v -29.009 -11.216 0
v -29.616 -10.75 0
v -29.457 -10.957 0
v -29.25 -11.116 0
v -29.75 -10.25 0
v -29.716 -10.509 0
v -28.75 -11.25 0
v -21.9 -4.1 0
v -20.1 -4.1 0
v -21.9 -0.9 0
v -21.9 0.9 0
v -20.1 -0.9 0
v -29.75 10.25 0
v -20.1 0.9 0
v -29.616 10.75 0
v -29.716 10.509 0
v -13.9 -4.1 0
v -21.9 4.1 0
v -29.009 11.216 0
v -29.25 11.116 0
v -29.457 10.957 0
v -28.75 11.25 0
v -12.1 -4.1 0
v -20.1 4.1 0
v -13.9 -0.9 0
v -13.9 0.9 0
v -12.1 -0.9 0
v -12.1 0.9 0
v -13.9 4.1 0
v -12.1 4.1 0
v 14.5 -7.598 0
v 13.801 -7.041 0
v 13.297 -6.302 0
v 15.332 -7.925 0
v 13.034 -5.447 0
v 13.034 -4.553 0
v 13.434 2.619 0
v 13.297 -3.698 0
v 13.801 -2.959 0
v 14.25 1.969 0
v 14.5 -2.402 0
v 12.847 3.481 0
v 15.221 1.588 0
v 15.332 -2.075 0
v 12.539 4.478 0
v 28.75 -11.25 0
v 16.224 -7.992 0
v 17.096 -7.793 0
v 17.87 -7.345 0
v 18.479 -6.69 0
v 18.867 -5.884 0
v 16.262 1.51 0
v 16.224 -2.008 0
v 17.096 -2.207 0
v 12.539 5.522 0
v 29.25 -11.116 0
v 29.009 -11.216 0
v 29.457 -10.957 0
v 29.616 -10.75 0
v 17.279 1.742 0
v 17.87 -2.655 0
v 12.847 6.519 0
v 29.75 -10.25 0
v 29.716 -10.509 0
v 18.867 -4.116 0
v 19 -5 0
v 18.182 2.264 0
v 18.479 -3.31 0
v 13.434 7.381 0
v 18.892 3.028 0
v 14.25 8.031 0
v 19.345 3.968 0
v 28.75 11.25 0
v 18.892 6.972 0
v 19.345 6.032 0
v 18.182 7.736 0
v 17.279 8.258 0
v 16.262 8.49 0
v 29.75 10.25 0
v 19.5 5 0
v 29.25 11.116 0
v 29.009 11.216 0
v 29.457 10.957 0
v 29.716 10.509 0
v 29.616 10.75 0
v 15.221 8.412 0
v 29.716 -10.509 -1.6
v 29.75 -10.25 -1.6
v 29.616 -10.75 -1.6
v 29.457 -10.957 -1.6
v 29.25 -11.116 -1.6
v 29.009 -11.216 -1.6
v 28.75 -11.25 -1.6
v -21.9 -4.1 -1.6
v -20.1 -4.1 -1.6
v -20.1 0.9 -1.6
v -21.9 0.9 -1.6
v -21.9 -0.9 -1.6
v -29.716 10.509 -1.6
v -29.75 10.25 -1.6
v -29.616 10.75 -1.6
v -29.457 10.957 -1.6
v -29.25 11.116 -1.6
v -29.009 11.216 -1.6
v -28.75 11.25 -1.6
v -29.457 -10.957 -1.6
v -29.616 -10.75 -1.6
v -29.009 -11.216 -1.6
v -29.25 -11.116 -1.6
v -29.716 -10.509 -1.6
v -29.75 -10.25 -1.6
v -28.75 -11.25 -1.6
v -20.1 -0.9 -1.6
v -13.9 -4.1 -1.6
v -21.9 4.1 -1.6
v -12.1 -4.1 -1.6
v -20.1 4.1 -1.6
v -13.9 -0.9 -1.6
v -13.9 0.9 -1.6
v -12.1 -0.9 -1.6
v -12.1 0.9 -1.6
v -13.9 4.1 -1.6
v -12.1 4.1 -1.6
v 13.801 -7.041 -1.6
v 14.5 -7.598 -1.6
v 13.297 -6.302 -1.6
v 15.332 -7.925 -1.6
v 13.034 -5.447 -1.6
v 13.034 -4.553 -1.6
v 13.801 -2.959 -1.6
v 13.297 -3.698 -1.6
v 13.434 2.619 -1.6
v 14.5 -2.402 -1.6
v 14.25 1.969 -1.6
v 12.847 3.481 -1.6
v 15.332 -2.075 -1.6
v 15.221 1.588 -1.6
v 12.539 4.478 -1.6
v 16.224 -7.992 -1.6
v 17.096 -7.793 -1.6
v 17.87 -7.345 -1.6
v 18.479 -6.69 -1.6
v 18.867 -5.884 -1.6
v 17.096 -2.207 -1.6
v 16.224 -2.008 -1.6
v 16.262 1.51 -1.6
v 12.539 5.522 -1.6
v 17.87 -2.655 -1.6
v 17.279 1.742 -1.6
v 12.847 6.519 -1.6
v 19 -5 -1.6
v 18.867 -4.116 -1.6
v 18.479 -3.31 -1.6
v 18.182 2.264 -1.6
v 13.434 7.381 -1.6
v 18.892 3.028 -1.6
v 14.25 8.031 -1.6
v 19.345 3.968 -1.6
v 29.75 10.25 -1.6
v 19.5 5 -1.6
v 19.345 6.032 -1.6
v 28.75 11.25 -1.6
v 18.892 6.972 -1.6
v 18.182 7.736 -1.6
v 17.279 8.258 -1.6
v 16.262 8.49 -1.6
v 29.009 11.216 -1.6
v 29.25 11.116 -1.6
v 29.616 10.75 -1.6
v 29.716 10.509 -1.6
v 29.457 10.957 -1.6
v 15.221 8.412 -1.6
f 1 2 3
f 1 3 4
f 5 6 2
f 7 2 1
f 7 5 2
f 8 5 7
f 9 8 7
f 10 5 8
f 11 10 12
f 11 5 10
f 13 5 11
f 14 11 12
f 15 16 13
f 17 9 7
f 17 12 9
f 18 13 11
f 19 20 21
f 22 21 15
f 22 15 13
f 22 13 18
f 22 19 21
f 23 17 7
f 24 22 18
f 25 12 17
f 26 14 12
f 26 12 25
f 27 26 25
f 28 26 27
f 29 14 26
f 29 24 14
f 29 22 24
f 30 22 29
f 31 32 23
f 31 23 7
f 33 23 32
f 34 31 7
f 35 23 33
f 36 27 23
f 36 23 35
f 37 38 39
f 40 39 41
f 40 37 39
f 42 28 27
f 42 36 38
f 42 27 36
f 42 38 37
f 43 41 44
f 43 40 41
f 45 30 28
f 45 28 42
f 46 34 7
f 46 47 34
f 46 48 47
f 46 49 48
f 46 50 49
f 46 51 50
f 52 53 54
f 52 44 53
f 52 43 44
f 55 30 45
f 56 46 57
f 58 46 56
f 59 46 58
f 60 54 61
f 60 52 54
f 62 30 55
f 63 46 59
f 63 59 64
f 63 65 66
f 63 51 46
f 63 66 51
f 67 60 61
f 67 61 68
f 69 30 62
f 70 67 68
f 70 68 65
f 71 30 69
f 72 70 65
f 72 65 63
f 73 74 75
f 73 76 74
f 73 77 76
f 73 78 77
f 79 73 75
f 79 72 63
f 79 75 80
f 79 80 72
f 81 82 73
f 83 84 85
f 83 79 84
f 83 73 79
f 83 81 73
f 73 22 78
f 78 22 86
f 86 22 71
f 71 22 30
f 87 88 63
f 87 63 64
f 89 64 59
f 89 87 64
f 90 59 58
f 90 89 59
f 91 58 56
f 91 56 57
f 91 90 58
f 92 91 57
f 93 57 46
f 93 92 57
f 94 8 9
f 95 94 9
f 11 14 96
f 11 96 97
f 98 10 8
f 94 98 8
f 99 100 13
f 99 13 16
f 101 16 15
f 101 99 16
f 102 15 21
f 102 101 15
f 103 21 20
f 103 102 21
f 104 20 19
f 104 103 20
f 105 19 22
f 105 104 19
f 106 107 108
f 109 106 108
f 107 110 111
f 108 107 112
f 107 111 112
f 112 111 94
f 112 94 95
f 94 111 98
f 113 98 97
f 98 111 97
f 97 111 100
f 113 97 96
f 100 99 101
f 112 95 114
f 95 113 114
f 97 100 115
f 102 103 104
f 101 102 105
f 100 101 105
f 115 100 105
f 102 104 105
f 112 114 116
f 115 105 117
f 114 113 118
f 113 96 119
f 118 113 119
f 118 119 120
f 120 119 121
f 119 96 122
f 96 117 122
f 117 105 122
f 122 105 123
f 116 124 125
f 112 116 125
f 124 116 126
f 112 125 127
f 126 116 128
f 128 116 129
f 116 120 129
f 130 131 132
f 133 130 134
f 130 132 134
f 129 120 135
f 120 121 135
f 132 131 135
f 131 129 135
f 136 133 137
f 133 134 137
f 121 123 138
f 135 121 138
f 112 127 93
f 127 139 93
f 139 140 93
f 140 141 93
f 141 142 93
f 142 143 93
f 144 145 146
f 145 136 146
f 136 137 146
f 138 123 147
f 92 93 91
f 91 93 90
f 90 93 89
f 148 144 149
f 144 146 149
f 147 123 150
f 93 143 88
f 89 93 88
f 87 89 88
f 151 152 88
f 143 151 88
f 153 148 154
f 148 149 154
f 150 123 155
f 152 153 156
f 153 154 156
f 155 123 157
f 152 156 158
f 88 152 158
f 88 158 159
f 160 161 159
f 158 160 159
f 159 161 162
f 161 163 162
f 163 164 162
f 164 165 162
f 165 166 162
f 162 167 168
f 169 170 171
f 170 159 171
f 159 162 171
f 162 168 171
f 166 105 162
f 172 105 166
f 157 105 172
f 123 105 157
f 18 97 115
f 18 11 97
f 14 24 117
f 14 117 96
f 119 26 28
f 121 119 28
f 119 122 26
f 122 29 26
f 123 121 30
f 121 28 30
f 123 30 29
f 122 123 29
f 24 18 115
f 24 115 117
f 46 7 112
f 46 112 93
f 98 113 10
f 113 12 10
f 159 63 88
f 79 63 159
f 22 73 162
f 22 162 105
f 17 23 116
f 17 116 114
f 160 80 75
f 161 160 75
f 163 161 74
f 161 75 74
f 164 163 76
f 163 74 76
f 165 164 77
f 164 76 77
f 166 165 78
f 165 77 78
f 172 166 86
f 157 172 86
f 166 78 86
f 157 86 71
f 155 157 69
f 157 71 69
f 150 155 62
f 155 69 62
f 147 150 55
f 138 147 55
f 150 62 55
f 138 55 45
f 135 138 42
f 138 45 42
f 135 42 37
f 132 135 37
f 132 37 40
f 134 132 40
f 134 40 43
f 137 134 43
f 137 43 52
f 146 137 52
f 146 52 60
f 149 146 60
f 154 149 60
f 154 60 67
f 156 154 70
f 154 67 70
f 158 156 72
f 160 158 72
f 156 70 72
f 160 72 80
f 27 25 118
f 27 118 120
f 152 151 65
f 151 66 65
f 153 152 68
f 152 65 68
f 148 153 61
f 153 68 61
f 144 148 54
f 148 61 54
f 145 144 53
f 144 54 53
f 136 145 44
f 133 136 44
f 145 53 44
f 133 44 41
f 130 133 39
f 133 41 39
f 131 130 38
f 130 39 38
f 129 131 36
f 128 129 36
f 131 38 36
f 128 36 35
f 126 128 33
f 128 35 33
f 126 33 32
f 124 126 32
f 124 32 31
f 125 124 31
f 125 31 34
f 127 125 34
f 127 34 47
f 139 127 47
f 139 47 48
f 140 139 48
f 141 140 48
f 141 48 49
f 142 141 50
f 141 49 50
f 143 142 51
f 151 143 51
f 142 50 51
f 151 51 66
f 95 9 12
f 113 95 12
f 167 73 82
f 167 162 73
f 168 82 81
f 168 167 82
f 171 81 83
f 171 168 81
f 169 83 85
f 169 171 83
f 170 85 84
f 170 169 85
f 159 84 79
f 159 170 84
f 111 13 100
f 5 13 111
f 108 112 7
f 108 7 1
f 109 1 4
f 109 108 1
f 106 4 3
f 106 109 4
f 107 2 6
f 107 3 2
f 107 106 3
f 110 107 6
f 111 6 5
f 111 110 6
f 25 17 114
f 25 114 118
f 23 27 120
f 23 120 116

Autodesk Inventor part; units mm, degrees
ref_plane "YZ Plane" through (0, 0, 0) normal (1, 0, 0) x (0, 1, 0)
ref_plane "XZ Plane" through (0, 0, 0) normal (0, 1, 0) x (-1, 0, 0)
ref_plane "XY Plane" through (0, 0, 0) normal (0, 0, 1) x (1, 0, 0)
sketch "Sketch1" plane through (0, 0, 0) normal (0, 0, 1) x (1, 0, 0)
  line L0 (-29.75, -11.25) -> (29.75, -11.25)
  line L1 (29.75, -11.25) -> (29.75, 11.25)
  line L2 (29.75, 11.25) -> (-29.75, 11.25)
  line L3 (-29.75, 11.25) -> (-29.75, -11.25)
  line L4 (-29.75, -11.25) -> (29.75, 11.25) construction
  line L5 (29.75, -11.25) -> (-29.75, 11.25) construction
  point P0 (0, 0)
  dimension "d0" = 59.5
  dimension "d1" = 22.5
extrude "Extrusion1" add sketch "Sketch1" against normal blind 1.6
fillet "Fillet1" radius 1 4 edges at (29.75, 11.25, -0.8) (-29.75, 11.25, -0.8) (29.75, -11.25, -0.8) (-29.75, -11.25, -0.8)
sketch "Sketch2" plane through (0, 0, 0) normal (0, 0, 1) x (1, 0, 0)
  line L0 (-21.9, 4.1) -> (-20.1, 4.1)
  line L1 (-20.1, 4.1) -> (-20.1, 0.9)
  line L2 (-20.1, 0.9) -> (-21.9, 0.9)
  line L3 (-21.9, 0.9) -> (-21.9, 4.1)
  line L4 (-21.9, 4.1) -> (-20.1, 0.9) construction
  line L5 (-20.1, 4.1) -> (-21.9, 0.9) construction
  line L6 (-20.1, -0.9) -> (-21.9, -0.9)
  line L7 (-21.9, -0.9) -> (-21.9, -4.1)
  line L8 (-21.9, -4.1) -> (-20.1, -4.1)
  line L9 (-20.1, -4.1) -> (-20.1, -0.9)
  line L10 (-20.1, -0.9) -> (-21.9, -4.1) construction
  line L11 (-21.9, -0.9) -> (-20.1, -4.1) construction
  line L12 (-17, 0) -> (-17, 5.3945) construction
  line L13 (-12.1, 4.1) -> (-13.9, 4.1)
  line L14 (-13.9, 4.1) -> (-13.9, 0.9)
  line L15 (-13.9, 0.9) -> (-12.1, 0.9)
  line L16 (-12.1, 0.9) -> (-12.1, 4.1)
  line L17 (-12.1, 4.1) -> (-13.9, 0.9) construction
  line L18 (-13.9, 4.1) -> (-12.1, 0.9) construction
  line L19 (-13.9, -0.9) -> (-12.1, -0.9)
  line L20 (-12.1, -0.9) -> (-12.1, -4.1)
  line L21 (-12.1, -4.1) -> (-13.9, -4.1)
  line L22 (-13.9, -4.1) -> (-13.9, -0.9)
  line L23 (-13.9, -0.9) -> (-12.1, -4.1) construction
  line L24 (-12.1, -0.9) -> (-13.9, -4.1) construction
  line L25 (-29.75, 10.25) -> (-29.75, -10.25) projected
  line L26 (-28.75, -11.25) -> (28.75, -11.25) projected
  point P0 (0, 0)
  point P1 (-21, 2.5)
  point P2 (-21, -2.5)
  point P3 (-13, 2.5)
  point P4 (-13, -2.5)
  dimension "d5" = 17
  dimension "d6" = 1.8
  dimension "d7" = 0.9
  dimension "d8" = 0
  dimension "d10" = 1.8
  dimension "d11" = 1.8
  dimension "d12" = 3.2
  dimension "d13" = 3.2
  dimension "d16" = 4
  dimension "d17" = 8.75
  dimension "d28" = 11.25
  dimension "d29" = 16.75
extrude "Extrusion2" cut sketch "Sketch2" against normal blind 1.6
sketch "Sketch3" plane through (0, 0, 0) normal (0, 0, 1) x (1, 0, 0)
  line L0 (-29.75, 10.25) -> (-29.75, -10.25) construction
  line L1 (16, 5) -> (16, -5) construction
  circle A0 centre (16, 5) radius 3.5
  circle A1 centre (16, -5) radius 3
  line L2 (-28.75, -11.25) -> (28.75, -11.25) projected
  point P0 (0, 0)
  dimension "d18" = 7
  dimension "d19" = 6
  dimension "d20" = 10
  dimension "d21" = 5
  dimension "d22" = 16
  dimension "d25" = 45.75
  dimension "d26" = 6.25
  dimension "d27" = 16.25
extrude "Extrusion3" cut sketch "Sketch3" against normal through all
sketch "Sketch4" plane through (0, 0, 0) normal (0, 0, 1) x (1, 0, 0)
  line L0 (-29.75, 11.25) -> (29.75, 11.25) construction
  line L1 (29.75, 11.25) -> (29.75, -11.2319) construction
  line L2 (29.75, -11.2319) -> (-29.75, -11.2319) construction
  line L3 (-29.75, -11.2319) -> (-29.75, 11.25) construction
  line L4 (28.75, 11.25) -> (-28.75, 11.25) projected
  line L5 (-29.75, 10.25) -> (-29.75, -10.25) projected
  line L6 (29.75, -10.25) -> (29.75, 10.25) projected
  point P0 (0, 0)
decal "Decal1"
sketch "Sketch5" plane through (0, 0, -1.6) normal (0, 0, -1) x (-1, 0, 0)
  line L0 (-29.75, 11.25) -> (29.75, 11.25) construction
  line L1 (29.75, 11.25) -> (29.75, -11.2319) construction
  line L2 (29.75, -11.2319) -> (-29.75, -11.2319) construction
  line L3 (-29.75, -11.2319) -> (-29.75, 11.25) construction
  line L4 (28.75, 11.25) -> (-28.75, 11.25) projected
  line L5 (-29.75, 10.25) -> (-29.75, -10.25) projected
  line L6 (29.75, -10.25) -> (29.75, 10.25) projected
  point P0 (0, 0)
decal "Decal2"
equation "\"d7\" = 0.5 * d6"
equation "\"d21\" = 0.5 * d20"
properties part number "KeyerFront_Iambic"
